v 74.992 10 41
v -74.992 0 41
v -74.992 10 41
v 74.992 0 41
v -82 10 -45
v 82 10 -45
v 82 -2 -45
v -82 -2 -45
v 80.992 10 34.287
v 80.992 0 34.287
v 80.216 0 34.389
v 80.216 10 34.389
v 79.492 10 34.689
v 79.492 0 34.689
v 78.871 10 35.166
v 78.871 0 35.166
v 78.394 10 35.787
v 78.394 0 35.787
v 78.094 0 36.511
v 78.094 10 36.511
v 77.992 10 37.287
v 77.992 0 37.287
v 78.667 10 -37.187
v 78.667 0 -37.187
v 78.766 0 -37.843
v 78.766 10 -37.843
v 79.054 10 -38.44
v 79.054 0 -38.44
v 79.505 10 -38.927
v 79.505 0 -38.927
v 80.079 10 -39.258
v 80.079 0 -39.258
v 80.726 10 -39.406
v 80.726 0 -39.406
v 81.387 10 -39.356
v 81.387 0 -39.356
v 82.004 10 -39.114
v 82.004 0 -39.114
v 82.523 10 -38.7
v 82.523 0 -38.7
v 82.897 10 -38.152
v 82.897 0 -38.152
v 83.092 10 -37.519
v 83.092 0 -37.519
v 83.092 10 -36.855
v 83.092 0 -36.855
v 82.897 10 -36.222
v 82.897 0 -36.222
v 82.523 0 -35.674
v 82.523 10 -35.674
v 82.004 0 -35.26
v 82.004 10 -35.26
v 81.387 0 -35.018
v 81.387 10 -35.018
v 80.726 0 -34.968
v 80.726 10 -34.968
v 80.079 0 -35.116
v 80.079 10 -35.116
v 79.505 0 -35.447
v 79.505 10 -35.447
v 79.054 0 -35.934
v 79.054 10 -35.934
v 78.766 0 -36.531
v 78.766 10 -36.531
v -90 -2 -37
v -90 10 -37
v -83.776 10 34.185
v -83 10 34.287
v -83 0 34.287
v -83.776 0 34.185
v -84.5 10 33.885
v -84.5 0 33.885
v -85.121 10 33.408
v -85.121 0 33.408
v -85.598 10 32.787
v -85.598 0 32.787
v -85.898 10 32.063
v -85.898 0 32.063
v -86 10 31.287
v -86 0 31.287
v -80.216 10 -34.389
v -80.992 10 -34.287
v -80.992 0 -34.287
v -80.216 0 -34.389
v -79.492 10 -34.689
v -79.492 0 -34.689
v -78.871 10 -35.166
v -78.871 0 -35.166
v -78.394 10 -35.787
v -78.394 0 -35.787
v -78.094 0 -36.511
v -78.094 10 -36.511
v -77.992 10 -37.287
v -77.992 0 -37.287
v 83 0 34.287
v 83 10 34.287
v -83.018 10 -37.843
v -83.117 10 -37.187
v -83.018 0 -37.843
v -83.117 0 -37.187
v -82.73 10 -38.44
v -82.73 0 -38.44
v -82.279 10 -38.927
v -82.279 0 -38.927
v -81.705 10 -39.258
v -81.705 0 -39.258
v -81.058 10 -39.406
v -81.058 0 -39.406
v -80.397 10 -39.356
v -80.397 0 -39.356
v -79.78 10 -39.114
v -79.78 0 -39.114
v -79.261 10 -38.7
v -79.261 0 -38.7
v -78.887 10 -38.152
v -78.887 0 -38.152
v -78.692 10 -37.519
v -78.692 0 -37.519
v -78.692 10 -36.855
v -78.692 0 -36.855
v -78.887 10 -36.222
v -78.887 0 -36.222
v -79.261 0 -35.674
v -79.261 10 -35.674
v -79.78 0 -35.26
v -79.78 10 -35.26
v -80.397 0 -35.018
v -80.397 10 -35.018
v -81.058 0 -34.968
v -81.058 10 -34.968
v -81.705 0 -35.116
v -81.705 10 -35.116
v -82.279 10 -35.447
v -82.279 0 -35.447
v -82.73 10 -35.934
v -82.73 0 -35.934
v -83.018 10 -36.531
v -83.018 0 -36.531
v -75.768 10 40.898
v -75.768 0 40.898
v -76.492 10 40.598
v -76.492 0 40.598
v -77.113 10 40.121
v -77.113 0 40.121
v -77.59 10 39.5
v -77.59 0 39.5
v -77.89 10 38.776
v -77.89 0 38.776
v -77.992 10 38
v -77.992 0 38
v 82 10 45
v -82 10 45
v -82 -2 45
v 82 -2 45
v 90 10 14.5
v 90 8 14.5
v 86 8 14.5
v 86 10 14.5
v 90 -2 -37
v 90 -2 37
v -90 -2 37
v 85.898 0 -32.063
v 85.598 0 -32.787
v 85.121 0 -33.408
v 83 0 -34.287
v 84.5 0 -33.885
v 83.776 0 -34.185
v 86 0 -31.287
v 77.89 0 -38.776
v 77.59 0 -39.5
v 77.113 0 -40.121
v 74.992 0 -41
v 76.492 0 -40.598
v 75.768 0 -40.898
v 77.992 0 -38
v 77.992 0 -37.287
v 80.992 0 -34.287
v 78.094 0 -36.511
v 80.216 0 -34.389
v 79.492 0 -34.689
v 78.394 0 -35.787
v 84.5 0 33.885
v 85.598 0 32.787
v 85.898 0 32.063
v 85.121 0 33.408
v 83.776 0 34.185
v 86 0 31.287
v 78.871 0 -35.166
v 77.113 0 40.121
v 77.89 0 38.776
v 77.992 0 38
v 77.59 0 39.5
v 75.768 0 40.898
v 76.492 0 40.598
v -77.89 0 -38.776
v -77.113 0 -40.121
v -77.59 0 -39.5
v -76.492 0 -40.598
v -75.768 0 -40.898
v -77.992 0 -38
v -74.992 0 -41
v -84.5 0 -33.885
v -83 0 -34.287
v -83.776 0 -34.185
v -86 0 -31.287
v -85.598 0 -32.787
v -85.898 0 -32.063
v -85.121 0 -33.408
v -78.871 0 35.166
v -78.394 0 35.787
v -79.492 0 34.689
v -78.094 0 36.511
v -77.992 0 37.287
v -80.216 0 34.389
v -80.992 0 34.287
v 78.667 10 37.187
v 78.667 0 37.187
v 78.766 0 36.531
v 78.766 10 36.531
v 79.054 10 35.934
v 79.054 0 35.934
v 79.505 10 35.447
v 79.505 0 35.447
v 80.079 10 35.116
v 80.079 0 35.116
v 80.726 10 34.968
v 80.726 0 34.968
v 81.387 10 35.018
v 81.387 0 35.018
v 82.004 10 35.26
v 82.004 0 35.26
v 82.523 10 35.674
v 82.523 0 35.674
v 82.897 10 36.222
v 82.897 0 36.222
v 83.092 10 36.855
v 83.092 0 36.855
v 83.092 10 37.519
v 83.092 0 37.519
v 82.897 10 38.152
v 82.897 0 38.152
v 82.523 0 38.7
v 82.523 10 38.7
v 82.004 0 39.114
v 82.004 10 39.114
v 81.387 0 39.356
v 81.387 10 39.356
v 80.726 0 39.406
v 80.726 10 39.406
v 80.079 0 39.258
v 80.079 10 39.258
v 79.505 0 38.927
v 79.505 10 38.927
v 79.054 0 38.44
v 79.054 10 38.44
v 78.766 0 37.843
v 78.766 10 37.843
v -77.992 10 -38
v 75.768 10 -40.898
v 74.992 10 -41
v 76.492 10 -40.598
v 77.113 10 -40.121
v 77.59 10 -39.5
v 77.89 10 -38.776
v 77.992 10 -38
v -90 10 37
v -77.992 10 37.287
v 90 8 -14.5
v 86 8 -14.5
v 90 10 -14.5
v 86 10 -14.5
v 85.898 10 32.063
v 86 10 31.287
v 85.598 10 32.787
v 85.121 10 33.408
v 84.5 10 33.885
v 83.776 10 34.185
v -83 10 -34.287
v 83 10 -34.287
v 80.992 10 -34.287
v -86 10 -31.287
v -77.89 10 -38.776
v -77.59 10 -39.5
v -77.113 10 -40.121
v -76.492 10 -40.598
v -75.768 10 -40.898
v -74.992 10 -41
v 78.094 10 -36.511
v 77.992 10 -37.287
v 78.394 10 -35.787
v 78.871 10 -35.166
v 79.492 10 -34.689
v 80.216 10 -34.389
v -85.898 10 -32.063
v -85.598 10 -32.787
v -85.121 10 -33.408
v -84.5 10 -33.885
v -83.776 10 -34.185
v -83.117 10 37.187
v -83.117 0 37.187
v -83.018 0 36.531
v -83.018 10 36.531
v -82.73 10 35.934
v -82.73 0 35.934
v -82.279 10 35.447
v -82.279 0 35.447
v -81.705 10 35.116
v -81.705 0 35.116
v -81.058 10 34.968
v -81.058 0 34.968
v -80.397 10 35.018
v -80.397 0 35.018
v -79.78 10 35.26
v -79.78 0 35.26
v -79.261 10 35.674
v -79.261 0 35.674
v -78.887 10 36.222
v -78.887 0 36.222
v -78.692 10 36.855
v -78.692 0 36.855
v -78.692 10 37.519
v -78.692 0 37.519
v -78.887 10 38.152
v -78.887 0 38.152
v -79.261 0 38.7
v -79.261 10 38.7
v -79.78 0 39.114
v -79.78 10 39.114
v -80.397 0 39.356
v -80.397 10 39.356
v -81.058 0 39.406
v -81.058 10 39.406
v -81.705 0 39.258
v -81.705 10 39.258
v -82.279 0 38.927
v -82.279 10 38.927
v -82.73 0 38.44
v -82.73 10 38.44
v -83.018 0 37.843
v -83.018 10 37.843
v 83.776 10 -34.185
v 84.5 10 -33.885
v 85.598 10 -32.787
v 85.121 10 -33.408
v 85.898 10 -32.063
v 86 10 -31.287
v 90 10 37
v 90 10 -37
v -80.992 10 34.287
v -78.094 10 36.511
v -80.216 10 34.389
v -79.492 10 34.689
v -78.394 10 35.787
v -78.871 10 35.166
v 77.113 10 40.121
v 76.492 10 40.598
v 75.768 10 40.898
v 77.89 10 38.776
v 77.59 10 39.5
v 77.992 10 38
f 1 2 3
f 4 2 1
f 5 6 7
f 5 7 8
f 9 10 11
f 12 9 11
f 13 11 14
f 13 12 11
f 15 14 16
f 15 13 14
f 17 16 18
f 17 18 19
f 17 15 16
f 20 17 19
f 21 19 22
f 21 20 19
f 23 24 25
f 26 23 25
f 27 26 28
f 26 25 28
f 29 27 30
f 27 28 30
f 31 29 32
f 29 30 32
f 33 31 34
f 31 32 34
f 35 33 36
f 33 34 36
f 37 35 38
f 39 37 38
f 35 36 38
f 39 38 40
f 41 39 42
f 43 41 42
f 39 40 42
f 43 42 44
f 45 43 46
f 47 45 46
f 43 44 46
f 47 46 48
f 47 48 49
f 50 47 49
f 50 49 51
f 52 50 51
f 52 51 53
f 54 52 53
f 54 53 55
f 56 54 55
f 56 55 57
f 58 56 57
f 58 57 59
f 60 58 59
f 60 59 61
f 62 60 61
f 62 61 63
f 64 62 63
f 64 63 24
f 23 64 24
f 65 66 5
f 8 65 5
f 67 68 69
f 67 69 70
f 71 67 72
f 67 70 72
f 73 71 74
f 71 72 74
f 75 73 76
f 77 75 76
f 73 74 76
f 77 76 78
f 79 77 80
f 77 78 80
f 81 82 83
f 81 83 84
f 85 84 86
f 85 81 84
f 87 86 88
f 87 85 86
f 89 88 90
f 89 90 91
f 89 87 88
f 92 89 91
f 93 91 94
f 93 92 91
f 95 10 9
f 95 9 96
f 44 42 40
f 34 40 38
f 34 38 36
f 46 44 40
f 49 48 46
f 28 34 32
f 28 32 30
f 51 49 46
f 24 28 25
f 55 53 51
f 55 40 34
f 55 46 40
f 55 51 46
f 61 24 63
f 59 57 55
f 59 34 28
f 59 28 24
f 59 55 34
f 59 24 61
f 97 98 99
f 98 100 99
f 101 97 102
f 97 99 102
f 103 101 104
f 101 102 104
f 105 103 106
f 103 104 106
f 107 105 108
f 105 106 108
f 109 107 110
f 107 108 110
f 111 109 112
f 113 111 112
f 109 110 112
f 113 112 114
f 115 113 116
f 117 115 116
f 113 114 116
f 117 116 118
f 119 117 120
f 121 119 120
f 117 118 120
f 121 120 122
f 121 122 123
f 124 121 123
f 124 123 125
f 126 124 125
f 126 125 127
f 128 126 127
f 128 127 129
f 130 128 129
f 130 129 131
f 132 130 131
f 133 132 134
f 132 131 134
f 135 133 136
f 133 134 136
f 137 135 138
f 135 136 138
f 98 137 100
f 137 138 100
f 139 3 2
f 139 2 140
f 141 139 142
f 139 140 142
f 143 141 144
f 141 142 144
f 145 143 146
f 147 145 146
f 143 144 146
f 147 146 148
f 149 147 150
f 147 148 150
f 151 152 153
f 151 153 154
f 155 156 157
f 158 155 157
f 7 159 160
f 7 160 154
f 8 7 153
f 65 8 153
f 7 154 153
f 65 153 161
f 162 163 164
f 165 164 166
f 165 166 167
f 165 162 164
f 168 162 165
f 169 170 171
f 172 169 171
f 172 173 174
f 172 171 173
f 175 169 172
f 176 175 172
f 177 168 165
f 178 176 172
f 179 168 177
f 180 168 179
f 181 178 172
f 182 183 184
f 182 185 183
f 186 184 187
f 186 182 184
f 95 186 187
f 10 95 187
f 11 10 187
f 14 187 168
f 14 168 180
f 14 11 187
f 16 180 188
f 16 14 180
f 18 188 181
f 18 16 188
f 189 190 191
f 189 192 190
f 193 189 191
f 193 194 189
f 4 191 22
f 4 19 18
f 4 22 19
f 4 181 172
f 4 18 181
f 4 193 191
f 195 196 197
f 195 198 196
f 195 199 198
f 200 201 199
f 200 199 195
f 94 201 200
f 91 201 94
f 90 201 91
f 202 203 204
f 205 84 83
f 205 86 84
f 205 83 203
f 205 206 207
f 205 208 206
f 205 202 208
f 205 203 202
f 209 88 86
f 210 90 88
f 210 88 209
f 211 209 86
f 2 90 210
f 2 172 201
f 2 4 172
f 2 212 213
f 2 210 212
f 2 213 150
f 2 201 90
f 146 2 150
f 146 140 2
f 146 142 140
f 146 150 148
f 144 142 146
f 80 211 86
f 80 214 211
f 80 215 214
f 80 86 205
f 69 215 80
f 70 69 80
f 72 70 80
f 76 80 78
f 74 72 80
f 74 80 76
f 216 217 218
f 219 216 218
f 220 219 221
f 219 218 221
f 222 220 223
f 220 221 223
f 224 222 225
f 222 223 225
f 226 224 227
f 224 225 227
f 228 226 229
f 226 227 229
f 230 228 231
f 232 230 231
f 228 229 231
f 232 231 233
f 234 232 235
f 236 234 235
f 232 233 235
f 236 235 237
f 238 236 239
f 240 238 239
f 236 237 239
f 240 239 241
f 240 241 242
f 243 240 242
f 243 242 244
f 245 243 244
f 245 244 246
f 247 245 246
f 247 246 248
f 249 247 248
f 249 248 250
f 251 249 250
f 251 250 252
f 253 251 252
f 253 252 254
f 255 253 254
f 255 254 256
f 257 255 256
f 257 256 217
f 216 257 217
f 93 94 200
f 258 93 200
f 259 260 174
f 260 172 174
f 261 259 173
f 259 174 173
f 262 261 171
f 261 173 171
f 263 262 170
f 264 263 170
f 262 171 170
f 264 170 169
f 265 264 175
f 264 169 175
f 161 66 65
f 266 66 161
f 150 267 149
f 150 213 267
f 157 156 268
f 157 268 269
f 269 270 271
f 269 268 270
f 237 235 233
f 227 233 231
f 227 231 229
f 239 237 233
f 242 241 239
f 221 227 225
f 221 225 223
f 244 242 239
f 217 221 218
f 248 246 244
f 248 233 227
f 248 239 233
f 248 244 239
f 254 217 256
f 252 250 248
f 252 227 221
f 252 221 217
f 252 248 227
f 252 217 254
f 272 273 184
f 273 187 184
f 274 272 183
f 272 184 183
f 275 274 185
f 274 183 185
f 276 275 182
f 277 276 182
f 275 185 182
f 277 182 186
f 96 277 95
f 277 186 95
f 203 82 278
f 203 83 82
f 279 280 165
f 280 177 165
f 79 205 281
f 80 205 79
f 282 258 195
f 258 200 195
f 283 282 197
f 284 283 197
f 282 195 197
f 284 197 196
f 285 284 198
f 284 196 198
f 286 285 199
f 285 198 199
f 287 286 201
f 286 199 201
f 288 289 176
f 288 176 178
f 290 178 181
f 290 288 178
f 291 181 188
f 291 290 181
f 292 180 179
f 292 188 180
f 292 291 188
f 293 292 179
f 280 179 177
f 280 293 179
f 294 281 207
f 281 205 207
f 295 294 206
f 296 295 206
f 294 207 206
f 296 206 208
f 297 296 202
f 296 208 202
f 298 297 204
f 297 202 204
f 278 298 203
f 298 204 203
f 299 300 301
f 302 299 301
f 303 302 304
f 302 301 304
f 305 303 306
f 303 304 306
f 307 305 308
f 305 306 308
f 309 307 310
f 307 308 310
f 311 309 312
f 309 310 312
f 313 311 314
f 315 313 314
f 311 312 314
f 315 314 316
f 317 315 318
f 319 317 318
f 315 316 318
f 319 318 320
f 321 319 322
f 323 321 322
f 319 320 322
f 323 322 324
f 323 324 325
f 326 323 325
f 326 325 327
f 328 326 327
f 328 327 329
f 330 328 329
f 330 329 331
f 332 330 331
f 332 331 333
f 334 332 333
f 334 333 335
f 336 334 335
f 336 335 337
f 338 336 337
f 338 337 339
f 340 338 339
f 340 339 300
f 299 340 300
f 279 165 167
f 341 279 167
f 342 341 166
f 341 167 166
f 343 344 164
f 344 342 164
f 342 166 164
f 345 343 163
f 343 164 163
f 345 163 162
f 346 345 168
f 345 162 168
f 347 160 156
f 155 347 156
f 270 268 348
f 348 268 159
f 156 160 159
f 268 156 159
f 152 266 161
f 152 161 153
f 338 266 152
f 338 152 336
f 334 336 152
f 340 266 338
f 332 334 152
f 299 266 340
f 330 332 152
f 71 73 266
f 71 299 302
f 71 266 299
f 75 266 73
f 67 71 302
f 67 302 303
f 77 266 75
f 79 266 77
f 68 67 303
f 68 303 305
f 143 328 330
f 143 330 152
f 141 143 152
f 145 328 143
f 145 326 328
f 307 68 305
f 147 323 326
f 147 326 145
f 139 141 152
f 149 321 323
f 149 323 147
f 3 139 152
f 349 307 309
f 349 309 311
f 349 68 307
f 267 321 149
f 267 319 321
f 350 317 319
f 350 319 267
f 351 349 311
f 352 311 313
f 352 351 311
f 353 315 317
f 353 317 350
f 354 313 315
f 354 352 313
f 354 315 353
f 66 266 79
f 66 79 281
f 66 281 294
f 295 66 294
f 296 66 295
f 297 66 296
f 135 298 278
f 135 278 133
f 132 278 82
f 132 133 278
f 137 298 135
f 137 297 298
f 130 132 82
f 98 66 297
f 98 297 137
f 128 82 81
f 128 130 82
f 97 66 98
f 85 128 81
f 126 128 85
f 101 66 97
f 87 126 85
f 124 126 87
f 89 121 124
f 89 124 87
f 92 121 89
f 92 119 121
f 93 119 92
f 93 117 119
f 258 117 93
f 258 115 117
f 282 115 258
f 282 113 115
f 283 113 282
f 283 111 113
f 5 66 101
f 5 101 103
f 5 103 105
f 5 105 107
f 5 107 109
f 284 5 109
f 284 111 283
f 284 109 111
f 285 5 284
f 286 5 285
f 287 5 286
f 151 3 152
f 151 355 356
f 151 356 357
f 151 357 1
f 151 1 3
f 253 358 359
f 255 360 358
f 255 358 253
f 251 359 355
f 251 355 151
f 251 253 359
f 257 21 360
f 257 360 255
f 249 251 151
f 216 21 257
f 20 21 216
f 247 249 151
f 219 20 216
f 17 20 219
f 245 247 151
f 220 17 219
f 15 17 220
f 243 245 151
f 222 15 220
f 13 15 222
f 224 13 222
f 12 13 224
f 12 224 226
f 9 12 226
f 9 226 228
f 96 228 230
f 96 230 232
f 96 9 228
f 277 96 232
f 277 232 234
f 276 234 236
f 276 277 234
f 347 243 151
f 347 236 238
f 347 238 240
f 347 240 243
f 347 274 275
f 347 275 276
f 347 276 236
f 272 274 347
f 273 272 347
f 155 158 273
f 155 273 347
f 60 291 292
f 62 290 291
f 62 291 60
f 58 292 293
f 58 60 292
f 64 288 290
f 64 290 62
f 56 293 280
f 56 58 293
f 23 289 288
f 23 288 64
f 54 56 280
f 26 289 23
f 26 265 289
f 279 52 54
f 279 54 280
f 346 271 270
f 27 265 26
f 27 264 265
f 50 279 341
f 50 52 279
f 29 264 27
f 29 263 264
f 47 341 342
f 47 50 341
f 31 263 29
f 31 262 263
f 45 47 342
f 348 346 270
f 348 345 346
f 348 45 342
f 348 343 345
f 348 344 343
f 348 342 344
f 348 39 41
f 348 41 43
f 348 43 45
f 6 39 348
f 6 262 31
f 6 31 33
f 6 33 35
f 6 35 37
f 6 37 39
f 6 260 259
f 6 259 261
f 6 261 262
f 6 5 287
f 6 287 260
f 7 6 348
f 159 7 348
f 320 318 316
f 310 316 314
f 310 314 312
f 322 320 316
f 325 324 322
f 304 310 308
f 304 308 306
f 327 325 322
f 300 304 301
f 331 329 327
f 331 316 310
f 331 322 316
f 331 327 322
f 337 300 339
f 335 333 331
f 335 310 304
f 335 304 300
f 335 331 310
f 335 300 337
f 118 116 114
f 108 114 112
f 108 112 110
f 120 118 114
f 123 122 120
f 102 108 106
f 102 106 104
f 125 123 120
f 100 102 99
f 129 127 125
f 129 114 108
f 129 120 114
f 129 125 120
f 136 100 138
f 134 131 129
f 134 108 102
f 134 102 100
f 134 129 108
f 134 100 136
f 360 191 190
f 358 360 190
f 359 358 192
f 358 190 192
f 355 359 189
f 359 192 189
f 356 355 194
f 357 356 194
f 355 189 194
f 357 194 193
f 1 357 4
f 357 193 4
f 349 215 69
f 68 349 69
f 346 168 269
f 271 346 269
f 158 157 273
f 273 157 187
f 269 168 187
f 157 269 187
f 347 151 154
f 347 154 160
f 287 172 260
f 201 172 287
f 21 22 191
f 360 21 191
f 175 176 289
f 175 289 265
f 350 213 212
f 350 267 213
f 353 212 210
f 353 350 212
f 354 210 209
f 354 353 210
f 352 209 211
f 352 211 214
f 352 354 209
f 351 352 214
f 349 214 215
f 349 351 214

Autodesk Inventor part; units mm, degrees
ref_plane "YZ Plane" through (0, 0, 0) normal (1, 0, 0) x (0, 1, 0)
ref_plane "XZ Plane" through (0, 0, 0) normal (0, 1, 0) x (-1, 0, 0)
ref_plane "XY Plane" through (0, 0, 0) normal (0, 0, 1) x (1, 0, 0)
sketch "Sketch1" plane through (0, 0, 0) normal (0, 1, 0) x (-1, 0, 0)
  line L0 (82, 45) -> (-82, 45)
  line L1 (-90, 37) -> (-90, -37)
  line L2 (-82, -45) -> (82, -45)
  line L3 (90, -37) -> (90, 37)
  line L4 (90, 45) -> (-90, -45) construction
  line L5 (-90, 45) -> (90, -45) construction
  line L6 (90, 37) -> (82, 45)
  line L7 (90, -37) -> (82, -45)
  line L8 (-82, 45) -> (-90, 37)
  line L9 (-82, -45) -> (-90, -37)
  line L10 (90, -37) -> (80.892, -37)
  line L11 (80.892, -37) -> (80.892, -37.187)
  line L12 (80.892, -37) -> (81.079, -37) construction
  circle A0 centre (80.892, -37.187) radius 0.725
  circle A1 centre (80.892, -37.187) radius 2.225
  line L13 (90, 37) -> (80.892, 37)
  line L14 (80.892, 37) -> (80.892, 37.187)
  circle A2 centre (80.892, 37.187) radius 0.725
  circle A3 centre (80.892, 37.187) radius 2.225
  line L15 (-90, 37) -> (-80.892, 37)
  line L16 (-90, 37) -> (-80.892, 37) construction
  line L17 (-80.892, 37) -> (-80.892, 37.187)
  circle A4 centre (-80.892, 37.187) radius 0.725
  circle A5 centre (-80.892, 37.187) radius 2.225
  line L18 (-90, -37) -> (-80.892, -37)
  line L19 (-90, -37) -> (-80.892, -37) construction
  line L20 (-80.892, -37) -> (-80.892, -37.187)
  line L21 (-80.892, -37) -> (-80.705, -37) construction
  circle A6 centre (-80.892, -37.187) radius 0.725
  circle A7 centre (-80.892, -37.187) radius 2.225
  line L22 (80.892, -37.187) -> (80.892, -34.287)
  line L23 (80.892, -37.187) -> (83.792, -37.187) construction
  line L24 (80.892, -37.187) -> (77.992, -37.187)
  line L25 (80.892, -37.187) -> (83.792, -37.187) construction
  line L26 (77.992, -37.187) -> (77.992, -45)
  line L27 (80.892, 37.187) -> (80.892, 34.287)
  line L28 (80.892, 37.187) -> (83.792, 37.187) construction
  line L29 (80.892, 34.287) -> (90, 34.287)
  line L30 (80.892, 37.187) -> (77.992, 37.187)
  line L31 (80.892, 37.187) -> (83.792, 37.187) construction
  line L32 (-80.892, -37.187) -> (-80.892, -34.287)
  line L33 (-80.892, -37.187) -> (-77.992, -37.187) construction
  line L34 (-80.892, -34.287) -> (-90, -34.287)
  line L35 (-80.892, -37.187) -> (-77.992, -37.187)
  line L36 (-80.892, -37.187) -> (-77.992, -37.187) construction
  line L37 (-77.992, -37.187) -> (-77.992, -45)
  line L38 (-77.992, -37.187) -> (-70.179, -37.187) construction
  line L39 (-80.892, 37.187) -> (-77.992, 37.187)
  line L40 (-80.892, 37.187) -> (-77.992, 37.187) construction
  line L41 (-77.992, 37.187) -> (-77.992, 45)
  line L42 (-80.892, 37.187) -> (-80.892, 34.287)
  line L43 (-80.892, 37.187) -> (-77.992, 37.187) construction
  line L44 (-80.892, 34.287) -> (-90, 34.287)
  line L45 (-77.992, 37.187) -> (-77.992, 34.287)
  line L46 (-77.992, 34.287) -> (-80.892, 34.287)
  line L47 (-80.892, -34.287) -> (-77.992, -34.287)
  line L48 (-77.992, -34.287) -> (-77.992, -37.187)
  line L49 (77.992, 37.187) -> (77.992, 45)
  line L50 (77.992, 37.187) -> (85.805, 37.187) construction
  line L51 (80.892, 34.287) -> (77.992, 34.287)
  line L52 (77.992, 34.287) -> (77.992, 37.187)
  line L53 (80.892, -34.287) -> (90, -34.287)
  line L54 (80.892, -34.287) -> (90, -34.287) construction
  line L55 (77.992, -37.187) -> (77.992, -34.287)
  line L56 (77.992, -34.287) -> (80.892, -34.287)
  line L57 (-90, 0) -> (-90, 14.5)
  line L58 (-90, 0) -> (-90, -14.5)
  line L59 (-90, -14.5) -> (-86, -14.5)
  line L60 (-90, -14.5) -> (-86, -14.5) construction
  line L61 (-86, -14.5) -> (-86, 14.5)
  line L62 (-86, 14.5) -> (-90, 14.5)
  point P0 (0, 0)
  point P1 (-90, -34.287)
  point P2 (77.992, -45)
  point P3 (90, -34.287)
  point P4 (90, 34.287)
  point P5 (-90, 34.287)
  dimension "d31" = 12
  dimension "d0" = 180
  dimension "d1" = 90
  dimension "d2" = 8
  dimension "d3" = 8
  dimension "d4" = 8
  dimension "d5" = 8
  dimension "d6" = 8
  dimension "d7" = 8
  dimension "d8" = 8
  dimension "d9" = 8
  dimension "d34" = 9.108
  dimension "d35" = 0.187
  dimension "d36" = 90
  dimension "d37" = 1.45
  dimension "d38" = 4.45
  dimension "d39" = 9.108
  dimension "d40" = 0.187
  dimension "d41" = 90
  dimension "d42" = 1.45
  dimension "d43" = 4.45
  dimension "d44" = 9.108
  dimension "d45" = 0
  dimension "d46" = 0.187
  dimension "d47" = 90
  dimension "d48" = 1.45
  dimension "d49" = 4.45
  dimension "d50" = 9.108
  dimension "d51" = 0
  dimension "d52" = 0.187
  dimension "d53" = 90
  dimension "d54" = 1.45
  dimension "d55" = 4.45
  dimension "d58" = 2.9
  dimension "d59" = 90
  dimension "d62" = 2.9
  dimension "d63" = 180
  dimension "d64" = 7.813
  dimension "d65" = 90
  dimension "d66" = 2.9
  dimension "d67" = 90
  dimension "d68" = 9.108
  dimension "d69" = 90
  dimension "d70" = 2.9
  dimension "d71" = 180
  dimension "d74" = 2.9
  dimension "d75" = 90
  dimension "d76" = 9.108
  dimension "d77" = 90
  dimension "d78" = 2.9
  dimension "d79" = 0
  dimension "d80" = 7.813
  dimension "d81" = 90
  dimension "d82" = 2.9
  dimension "d83" = 0
  dimension "d84" = 7.813
  dimension "d85" = 90
  dimension "d86" = 2.9
  dimension "d87" = 90
  dimension "d88" = 9.108
  dimension "d89" = 90
  dimension "d90" = 2.9
  dimension "d91" = 2.9
  dimension "d92" = 2.9
  dimension "d93" = 2.9
extrude "Extrusion1" add sketch "Sketch1" against normal blind 2
sketch "Sketch2" plane through (0, 0, 0) normal (0, 1, 0) x (1, 0, 0)
  line L0 (-82, -45) -> (82, -45)
  line L1 (90, -37) -> (90, 37)
  line L2 (82, 45) -> (-82, 45)
  line L3 (-90, 37) -> (-90, -37)
  line L4 (-90, -45) -> (90, 45) construction
  line L5 (90, -45) -> (-90, 45) construction
  line L6 (-90, -37) -> (-82, -45)
  line L7 (-90, 37) -> (-82, 45)
  line L8 (82, 45) -> (90, 37)
  line L9 (82, -45) -> (90, -37)
  line L10 (-86, -35.3431) -> (-80.3431, -41)
  line L11 (-80.3431, -41) -> (80.3431, -41)
  line L12 (80.3431, -41) -> (86, -35.3431)
  line L13 (86, -35.3431) -> (86, 35.3431)
  line L14 (86, 35.3431) -> (80.3431, 41)
  line L15 (80.3431, 41) -> (-80.3431, 41)
  line L16 (-80.3431, 41) -> (-86, 35.3431)
  line L17 (-86, 35.3431) -> (-86, -35.3431)
  line L18 (0, 0) -> (90, 0)
  line L19 (90, 0) -> (90, -14.5)
  line L20 (90, -14.5) -> (0, -14.5)
  line L21 (0, -14.5) -> (0, 0)
  line L22 (0, 0) -> (90, 0)
  line L23 (90, 0) -> (90, 14.5)
  line L24 (90, 14.5) -> (0, 14.5)
  line L25 (0, 14.5) -> (0, 0)
  line L26 (-90, 35) -> (-81.5147, 26.5147)
  circle A0 centre (-81.5147, 26.5147) radius 1.45
  circle A1 centre (-81.5147, 26.5147) radius 4.45
  line L27 (-90, 35) -> (-77.0647, 35)
  line L28 (-77.0647, 35) -> (-77.0647, 22.0647)
  line L29 (-77.0647, 22.0647) -> (-90, 22.0647)
  line L30 (-90, 22.0647) -> (-90, 35)
  circle A2 centre (-81.5147, -26.5147) radius 1.45
  circle A3 centre (-81.5147, -26.5147) radius 4.45
  line L31 (-90, -35) -> (-77.0647, -35)
  line L32 (-77.0647, -35) -> (-77.0647, -22.0647)
  line L33 (-77.0647, -22.0647) -> (-90, -22.0647)
  line L34 (-90, -22.0647) -> (-90, -35)
  circle A4 centre (81.5147, 26.5147) radius 1.45
  circle A5 centre (81.5147, 26.5147) radius 4.45
  line L35 (77.0647, 35) -> (77.0647, 22.0647)
  line L36 (77.0647, 22.0647) -> (90, 22.0647)
  line L37 (77.0647, -22.0647) -> (90, -22.0647)
  line L38 (77.0647, -35) -> (77.0647, -22.0647)
  circle A6 centre (81.5147, -26.5147) radius 4.45
  circle A7 centre (81.5147, -26.5147) radius 1.45
  line L39 (90, -35) -> (77.0647, -35)
  line L40 (90, -22.0647) -> (90, -35)
  point P0 (86, -14.5)
  point P1 (86, 14.5)
  point P2 (81.5147, 22.0647)
  point P3 (86, 22.0647)
  point P4 (77.0647, 31)
  point P5 (77.0647, 26.5147)
  point P6 (77.0647, -26.5147)
  point P7 (77.0647, -31)
  point P8 (86, -22.0647)
  point P9 (81.5147, -22.0647)
  point P10 (-77.0647, -26.5147)
  point P11 (-81.5147, -22.0647)
  point P12 (-86, -22.0647)
  point P13 (-77.0647, -31)
  point P14 (-86, 22.0647)
  point P15 (-81.5147, 22.0647)
  point P16 (-77.0647, 26.5147)
  point P17 (-77.0647, 31)
  dimension "d12" = 180
  dimension "d13" = 90
  dimension "d14" = 8
  dimension "d15" = 8
  dimension "d16" = 8
  dimension "d17" = 8
  dimension "d18" = 8
  dimension "d19" = 8
  dimension "d20" = 8
  dimension "d21" = 8
  dimension "d22" = 4
  dimension "d23" = 90
  dimension "d24" = 14.5
  dimension "d25" = 90
  dimension "d26" = 14.5
  dimension "d31" = 12
  dimension "d32" = 2.9
  dimension "d33" = 3
extrude "Extrusion4" add sketch "Sketch2" along normal blind 10 contours L6 L3 L31 L17 L10 L11 L12 L13 L39 L1 L9 L0 | L3 L33 L17 L31 | L39 L13 L37 L1 | L3 L29 L17 L33 | L37 L13 L20 L1 | L3 L26 L17 L29 | L27 L17 L26 | L3 L7 L2 L8 L1 L36 L13 L14 L15 L16 L17 L27 | L24 L13 L36 L1
extrude "Extrusion5" add sketch "Sketch1" along normal blind 10 contours L6 L13 A3 L30 L49 L0 | L3 L29 L27 A3 L13 | L41 L39 A5 L15 L8 L0 | L30 A3 L27 L51 L52 | L45 L46 L42 A5 L39 | L3 L10 A1 L22 L53 | L15 A5 L42 L44 L1 | L7 L2 L26 L24 A1 L10 | L22 A1 L24 L55 L56 | L2 L9 L18 A7 L35 L37 | L35 A7 L32 L47 L48 | L34 L32 A7 L18 L1
extrude "Extrusion6" add sketch "Sketch1" along normal blind 8 contours L62 L61 L59 L1
fillet "Fillet1" radius 3 12 edges at (-77.992, 5, -41) (-77.992, 5, -34.287) (-86, 5, -34.287) (86, 5, -34.287) (77.992, 5, -34.287) (77.992, 5, -41) (86, 5, 34.287) (77.992, 5, 34.287) (77.992, 5, 41) (-77.992, 5, 34.287) (-86, 5, 34.287) (-77.992, 5, 41)
equation "\"d3\" = d2"
equation "\"d4\" = d2"
equation "\"d5\" = d4"
equation "\"d6\" = d2"
equation "\"d7\" = d6"
equation "\"d8\" = d2"
equation "\"d9\" = d8"
equation "\"d15\" = d14"
equation "\"d16\" = d14"
equation "\"d17\" = d16"
equation "\"d18\" = d14"
equation "\"d19\" = d18"
equation "\"d20\" = d14"
equation "\"d21\" = d20"
properties part number "enclosed base"
